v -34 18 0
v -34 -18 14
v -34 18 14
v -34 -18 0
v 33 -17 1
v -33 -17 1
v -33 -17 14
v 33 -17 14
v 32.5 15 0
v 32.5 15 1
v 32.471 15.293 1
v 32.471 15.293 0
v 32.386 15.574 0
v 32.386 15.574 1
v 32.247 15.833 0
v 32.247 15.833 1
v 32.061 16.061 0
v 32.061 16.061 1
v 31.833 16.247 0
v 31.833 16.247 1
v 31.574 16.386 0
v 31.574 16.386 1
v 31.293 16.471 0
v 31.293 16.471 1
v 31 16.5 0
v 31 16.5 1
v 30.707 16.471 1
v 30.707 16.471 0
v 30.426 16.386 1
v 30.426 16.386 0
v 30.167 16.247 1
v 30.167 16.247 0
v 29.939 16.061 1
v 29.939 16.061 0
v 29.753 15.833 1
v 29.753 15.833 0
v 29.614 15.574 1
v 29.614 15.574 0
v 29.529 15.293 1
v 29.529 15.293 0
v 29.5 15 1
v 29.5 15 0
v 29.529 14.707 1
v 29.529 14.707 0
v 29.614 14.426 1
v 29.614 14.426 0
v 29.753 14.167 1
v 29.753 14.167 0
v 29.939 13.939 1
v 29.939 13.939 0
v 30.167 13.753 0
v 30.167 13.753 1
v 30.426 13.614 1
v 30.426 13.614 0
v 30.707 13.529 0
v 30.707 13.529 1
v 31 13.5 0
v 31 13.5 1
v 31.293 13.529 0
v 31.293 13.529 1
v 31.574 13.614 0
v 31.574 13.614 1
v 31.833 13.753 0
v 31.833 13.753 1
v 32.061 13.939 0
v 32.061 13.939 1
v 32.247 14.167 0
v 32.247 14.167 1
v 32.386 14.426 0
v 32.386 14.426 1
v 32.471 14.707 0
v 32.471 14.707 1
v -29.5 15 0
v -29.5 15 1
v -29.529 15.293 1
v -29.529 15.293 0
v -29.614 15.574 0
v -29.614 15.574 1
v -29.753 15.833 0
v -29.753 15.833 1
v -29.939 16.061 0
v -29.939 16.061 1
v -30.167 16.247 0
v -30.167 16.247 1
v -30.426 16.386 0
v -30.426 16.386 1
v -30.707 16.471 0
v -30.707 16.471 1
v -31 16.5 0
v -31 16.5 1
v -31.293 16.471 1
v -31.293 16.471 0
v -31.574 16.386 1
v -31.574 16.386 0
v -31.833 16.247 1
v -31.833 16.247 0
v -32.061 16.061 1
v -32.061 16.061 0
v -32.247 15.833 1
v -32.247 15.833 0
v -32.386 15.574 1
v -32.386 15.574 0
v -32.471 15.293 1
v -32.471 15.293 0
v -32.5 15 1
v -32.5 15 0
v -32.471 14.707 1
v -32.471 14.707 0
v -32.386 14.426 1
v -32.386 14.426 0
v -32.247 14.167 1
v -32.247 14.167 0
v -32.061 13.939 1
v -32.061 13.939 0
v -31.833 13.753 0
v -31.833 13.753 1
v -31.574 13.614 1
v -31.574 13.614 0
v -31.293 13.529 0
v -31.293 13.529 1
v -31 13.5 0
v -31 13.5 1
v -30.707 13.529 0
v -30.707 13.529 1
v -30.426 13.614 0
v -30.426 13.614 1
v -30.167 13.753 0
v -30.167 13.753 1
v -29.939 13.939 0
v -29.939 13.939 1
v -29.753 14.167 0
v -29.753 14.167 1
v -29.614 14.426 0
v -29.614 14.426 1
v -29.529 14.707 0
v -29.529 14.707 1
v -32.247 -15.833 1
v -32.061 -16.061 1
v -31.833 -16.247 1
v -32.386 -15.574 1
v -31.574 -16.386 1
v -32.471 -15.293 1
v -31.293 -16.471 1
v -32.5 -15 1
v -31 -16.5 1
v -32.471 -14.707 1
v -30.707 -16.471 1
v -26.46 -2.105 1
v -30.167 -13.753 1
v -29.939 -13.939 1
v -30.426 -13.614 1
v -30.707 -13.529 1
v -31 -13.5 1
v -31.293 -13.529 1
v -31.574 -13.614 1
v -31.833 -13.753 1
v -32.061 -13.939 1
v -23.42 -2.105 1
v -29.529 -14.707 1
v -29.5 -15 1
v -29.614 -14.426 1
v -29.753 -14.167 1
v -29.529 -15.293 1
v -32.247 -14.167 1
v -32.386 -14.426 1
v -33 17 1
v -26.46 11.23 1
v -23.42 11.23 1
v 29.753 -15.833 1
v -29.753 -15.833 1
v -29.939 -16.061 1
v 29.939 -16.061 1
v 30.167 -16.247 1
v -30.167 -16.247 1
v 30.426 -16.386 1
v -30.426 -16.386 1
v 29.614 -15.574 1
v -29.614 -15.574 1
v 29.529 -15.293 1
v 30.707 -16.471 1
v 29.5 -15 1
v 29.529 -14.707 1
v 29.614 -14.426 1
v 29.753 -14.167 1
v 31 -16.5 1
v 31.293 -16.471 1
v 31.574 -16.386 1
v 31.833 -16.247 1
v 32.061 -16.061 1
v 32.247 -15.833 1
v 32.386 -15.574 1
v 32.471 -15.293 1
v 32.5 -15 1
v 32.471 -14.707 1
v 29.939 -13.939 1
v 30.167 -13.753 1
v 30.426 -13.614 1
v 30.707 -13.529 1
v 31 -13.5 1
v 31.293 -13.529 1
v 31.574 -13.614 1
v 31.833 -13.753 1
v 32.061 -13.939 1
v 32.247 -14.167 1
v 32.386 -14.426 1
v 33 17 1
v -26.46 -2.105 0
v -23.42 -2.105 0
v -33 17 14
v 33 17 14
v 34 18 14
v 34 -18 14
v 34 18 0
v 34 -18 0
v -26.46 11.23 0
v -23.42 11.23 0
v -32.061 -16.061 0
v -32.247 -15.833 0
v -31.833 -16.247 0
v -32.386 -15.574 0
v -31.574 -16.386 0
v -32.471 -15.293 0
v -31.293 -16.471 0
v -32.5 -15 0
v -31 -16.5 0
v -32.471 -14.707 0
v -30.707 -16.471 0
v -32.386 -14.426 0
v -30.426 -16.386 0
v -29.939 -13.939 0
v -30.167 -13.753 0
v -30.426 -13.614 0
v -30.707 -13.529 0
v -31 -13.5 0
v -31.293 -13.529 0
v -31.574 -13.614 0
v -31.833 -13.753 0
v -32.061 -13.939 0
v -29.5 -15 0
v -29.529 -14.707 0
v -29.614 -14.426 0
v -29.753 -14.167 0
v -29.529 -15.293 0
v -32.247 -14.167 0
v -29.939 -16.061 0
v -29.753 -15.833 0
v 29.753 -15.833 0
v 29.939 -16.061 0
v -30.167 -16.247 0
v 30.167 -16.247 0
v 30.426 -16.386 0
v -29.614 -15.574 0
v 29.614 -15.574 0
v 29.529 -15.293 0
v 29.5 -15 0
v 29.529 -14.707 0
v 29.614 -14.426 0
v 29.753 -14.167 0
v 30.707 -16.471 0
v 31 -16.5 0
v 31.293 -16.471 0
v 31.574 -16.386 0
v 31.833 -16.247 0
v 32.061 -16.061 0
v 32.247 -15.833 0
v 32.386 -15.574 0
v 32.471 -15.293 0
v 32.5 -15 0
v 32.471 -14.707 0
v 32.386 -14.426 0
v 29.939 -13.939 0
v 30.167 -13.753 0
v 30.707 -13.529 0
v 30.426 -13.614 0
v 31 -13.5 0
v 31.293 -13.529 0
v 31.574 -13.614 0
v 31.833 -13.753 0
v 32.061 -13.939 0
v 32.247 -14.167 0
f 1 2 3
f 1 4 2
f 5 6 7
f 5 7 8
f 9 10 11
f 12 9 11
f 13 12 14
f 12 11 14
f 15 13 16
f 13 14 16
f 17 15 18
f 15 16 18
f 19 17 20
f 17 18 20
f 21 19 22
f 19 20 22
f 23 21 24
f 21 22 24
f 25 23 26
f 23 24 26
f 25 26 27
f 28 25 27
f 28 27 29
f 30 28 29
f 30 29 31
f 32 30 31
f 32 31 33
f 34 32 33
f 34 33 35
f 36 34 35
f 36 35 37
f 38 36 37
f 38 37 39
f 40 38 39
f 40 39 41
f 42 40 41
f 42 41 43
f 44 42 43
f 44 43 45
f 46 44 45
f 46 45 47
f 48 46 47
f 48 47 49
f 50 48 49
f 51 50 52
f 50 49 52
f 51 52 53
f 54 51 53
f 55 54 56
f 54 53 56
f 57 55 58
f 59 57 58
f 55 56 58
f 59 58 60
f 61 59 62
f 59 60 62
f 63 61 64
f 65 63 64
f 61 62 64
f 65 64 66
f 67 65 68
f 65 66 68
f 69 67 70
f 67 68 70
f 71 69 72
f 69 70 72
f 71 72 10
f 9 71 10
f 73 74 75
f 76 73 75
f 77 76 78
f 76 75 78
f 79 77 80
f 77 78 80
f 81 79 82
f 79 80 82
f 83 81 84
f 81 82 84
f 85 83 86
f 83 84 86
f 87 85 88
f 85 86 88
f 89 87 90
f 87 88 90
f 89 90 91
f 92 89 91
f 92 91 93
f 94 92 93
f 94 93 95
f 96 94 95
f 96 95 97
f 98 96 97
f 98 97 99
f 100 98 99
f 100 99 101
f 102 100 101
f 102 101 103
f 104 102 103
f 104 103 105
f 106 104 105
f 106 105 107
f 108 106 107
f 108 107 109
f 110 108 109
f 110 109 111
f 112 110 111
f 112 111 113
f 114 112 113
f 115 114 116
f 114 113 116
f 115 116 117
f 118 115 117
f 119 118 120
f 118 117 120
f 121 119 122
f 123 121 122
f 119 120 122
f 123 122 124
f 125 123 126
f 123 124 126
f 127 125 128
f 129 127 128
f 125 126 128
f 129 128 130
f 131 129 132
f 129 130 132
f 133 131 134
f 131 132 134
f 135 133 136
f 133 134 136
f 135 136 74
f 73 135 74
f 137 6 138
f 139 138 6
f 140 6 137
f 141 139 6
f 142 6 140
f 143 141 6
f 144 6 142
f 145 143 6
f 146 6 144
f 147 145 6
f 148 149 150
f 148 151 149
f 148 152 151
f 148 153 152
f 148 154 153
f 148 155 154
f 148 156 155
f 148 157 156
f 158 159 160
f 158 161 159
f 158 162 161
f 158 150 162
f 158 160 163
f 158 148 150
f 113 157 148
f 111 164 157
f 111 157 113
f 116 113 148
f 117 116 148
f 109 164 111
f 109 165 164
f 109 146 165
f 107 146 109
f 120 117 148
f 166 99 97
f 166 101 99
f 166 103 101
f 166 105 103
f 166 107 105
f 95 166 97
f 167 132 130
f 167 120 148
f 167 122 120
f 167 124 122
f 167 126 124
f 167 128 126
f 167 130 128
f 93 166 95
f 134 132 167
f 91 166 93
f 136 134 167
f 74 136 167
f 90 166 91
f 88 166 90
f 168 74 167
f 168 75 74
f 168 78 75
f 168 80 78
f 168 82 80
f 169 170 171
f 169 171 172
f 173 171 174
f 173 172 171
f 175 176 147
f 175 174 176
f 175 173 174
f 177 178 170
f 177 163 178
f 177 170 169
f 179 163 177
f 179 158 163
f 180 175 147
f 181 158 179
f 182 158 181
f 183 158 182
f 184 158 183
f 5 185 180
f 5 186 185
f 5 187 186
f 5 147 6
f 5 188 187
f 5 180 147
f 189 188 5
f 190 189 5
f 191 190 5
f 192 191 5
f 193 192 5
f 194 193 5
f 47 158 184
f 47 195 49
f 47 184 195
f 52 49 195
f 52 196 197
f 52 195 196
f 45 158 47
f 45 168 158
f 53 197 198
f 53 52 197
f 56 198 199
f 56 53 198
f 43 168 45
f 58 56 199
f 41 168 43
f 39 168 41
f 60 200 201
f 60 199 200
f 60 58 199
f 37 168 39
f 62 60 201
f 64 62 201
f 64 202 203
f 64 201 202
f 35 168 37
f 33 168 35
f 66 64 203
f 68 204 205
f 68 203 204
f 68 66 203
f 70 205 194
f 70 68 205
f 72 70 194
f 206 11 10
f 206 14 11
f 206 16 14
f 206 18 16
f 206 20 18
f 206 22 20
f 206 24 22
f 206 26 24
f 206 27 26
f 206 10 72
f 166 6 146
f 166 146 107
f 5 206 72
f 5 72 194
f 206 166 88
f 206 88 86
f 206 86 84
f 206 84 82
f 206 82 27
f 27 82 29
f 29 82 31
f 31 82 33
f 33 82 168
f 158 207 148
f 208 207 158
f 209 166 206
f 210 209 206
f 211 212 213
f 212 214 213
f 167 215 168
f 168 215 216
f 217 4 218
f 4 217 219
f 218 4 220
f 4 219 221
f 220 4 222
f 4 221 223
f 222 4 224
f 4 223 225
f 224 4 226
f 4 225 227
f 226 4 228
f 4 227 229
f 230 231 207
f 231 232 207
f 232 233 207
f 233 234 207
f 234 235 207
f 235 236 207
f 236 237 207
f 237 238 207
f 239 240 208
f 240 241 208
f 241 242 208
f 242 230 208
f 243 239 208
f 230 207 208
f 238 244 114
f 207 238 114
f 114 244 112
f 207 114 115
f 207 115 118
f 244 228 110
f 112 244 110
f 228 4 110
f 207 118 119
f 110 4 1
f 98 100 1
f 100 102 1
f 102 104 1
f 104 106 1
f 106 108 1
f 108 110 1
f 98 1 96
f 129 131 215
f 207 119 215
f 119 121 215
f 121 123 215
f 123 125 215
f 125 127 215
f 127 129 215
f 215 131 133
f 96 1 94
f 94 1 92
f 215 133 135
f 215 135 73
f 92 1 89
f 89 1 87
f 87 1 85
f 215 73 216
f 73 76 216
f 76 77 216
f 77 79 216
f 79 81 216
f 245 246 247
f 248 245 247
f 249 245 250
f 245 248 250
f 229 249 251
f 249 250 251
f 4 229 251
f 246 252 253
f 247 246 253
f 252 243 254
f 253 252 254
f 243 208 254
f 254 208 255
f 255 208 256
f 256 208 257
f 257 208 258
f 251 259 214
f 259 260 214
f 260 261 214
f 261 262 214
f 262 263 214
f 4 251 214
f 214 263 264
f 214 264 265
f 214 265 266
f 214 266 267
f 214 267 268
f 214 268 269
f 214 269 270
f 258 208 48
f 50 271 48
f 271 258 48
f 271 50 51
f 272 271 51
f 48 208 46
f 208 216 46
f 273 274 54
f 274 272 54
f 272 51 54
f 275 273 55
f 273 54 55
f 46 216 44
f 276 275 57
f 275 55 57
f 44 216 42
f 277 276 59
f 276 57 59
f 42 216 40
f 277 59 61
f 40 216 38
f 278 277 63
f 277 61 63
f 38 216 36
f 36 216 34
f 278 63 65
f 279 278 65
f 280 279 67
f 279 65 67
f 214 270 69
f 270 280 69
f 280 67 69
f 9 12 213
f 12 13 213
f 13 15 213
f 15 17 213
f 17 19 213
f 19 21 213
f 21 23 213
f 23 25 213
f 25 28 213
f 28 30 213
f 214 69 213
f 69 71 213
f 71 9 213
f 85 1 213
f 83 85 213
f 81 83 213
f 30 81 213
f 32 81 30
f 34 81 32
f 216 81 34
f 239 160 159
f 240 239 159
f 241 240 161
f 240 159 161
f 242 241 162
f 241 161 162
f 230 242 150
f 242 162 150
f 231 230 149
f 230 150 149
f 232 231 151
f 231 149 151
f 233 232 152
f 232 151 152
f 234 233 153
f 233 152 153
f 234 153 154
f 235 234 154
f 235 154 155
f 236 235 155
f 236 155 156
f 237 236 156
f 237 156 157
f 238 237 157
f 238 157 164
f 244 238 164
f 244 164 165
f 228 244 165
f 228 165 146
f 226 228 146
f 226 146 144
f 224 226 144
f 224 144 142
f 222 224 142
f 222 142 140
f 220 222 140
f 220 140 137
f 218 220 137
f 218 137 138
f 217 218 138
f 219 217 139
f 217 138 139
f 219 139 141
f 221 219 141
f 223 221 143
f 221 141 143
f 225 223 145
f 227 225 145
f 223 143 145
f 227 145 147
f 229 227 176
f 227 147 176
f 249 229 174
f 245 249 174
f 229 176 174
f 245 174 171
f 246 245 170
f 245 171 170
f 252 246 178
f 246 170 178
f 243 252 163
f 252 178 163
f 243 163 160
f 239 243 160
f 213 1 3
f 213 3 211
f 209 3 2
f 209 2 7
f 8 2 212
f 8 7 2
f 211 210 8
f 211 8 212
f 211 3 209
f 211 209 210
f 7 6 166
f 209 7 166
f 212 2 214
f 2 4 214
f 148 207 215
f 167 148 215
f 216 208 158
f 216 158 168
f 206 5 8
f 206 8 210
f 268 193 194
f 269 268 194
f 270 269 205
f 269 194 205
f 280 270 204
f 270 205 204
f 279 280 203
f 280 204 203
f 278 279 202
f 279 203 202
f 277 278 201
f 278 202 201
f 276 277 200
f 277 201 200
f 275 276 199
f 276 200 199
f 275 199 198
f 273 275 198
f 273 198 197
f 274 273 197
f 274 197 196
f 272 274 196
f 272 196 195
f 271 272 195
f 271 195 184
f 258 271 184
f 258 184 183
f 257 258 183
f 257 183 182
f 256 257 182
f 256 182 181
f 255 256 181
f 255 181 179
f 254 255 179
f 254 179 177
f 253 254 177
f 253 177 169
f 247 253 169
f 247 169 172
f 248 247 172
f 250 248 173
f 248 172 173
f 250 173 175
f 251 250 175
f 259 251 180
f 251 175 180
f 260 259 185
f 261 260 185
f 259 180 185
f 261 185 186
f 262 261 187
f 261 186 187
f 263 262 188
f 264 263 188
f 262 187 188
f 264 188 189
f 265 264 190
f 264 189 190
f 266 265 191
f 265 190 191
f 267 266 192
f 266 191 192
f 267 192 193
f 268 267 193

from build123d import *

# Parameters (mm, degrees)
SKETCH069_W     = 68
SKETCH069_H     = 36
SKETCH069_W_2   = 3.04
SKETCH069_H_2   = 13.335
PAD048_DEPTH    = 1
SKETCH070_W     = 68
SKETCH070_H     = 36
SKETCH070_W_2   = 66
SKETCH070_H_2   = 34
PAD049_DEPTH    = 13
SKETCH073_R     = 1.5
POCKET013_DEPTH = 1.001


with BuildPart() as part:
    # Sketch069 → Pad048 (new body)
    with BuildSketch(Plane.XY):
        Rectangle(SKETCH069_W, SKETCH069_H)
        with Locations((-24.94, 4.5625)):
            Rectangle(SKETCH069_W_2, SKETCH069_H_2, mode=Mode.SUBTRACT)
    extrude(amount=PAD048_DEPTH)

    # Sketch070 (on Face10 of Pad048) → Pad049 (join)
    with BuildSketch(Plane.XY.offset(1)):
        Rectangle(SKETCH070_W, SKETCH070_H)
        Rectangle(SKETCH070_W_2, SKETCH070_H_2, mode=Mode.SUBTRACT)
    extrude(amount=PAD049_DEPTH)

    # Sketch073 (on Face15 of Pad049) → Pocket013 (cut, through all)
    with BuildSketch(Plane.XY.offset(1)):
        with Locations((-31, 15)):
            Circle(SKETCH073_R)
        with Locations((31, 15)):
            Circle(SKETCH073_R)
        with Locations((31, -15)):
            Circle(SKETCH073_R)
        with Locations((-31, -15)):
            Circle(SKETCH073_R)
    extrude(amount=-POCKET013_DEPTH, mode=Mode.SUBTRACT)


solid = part.part
